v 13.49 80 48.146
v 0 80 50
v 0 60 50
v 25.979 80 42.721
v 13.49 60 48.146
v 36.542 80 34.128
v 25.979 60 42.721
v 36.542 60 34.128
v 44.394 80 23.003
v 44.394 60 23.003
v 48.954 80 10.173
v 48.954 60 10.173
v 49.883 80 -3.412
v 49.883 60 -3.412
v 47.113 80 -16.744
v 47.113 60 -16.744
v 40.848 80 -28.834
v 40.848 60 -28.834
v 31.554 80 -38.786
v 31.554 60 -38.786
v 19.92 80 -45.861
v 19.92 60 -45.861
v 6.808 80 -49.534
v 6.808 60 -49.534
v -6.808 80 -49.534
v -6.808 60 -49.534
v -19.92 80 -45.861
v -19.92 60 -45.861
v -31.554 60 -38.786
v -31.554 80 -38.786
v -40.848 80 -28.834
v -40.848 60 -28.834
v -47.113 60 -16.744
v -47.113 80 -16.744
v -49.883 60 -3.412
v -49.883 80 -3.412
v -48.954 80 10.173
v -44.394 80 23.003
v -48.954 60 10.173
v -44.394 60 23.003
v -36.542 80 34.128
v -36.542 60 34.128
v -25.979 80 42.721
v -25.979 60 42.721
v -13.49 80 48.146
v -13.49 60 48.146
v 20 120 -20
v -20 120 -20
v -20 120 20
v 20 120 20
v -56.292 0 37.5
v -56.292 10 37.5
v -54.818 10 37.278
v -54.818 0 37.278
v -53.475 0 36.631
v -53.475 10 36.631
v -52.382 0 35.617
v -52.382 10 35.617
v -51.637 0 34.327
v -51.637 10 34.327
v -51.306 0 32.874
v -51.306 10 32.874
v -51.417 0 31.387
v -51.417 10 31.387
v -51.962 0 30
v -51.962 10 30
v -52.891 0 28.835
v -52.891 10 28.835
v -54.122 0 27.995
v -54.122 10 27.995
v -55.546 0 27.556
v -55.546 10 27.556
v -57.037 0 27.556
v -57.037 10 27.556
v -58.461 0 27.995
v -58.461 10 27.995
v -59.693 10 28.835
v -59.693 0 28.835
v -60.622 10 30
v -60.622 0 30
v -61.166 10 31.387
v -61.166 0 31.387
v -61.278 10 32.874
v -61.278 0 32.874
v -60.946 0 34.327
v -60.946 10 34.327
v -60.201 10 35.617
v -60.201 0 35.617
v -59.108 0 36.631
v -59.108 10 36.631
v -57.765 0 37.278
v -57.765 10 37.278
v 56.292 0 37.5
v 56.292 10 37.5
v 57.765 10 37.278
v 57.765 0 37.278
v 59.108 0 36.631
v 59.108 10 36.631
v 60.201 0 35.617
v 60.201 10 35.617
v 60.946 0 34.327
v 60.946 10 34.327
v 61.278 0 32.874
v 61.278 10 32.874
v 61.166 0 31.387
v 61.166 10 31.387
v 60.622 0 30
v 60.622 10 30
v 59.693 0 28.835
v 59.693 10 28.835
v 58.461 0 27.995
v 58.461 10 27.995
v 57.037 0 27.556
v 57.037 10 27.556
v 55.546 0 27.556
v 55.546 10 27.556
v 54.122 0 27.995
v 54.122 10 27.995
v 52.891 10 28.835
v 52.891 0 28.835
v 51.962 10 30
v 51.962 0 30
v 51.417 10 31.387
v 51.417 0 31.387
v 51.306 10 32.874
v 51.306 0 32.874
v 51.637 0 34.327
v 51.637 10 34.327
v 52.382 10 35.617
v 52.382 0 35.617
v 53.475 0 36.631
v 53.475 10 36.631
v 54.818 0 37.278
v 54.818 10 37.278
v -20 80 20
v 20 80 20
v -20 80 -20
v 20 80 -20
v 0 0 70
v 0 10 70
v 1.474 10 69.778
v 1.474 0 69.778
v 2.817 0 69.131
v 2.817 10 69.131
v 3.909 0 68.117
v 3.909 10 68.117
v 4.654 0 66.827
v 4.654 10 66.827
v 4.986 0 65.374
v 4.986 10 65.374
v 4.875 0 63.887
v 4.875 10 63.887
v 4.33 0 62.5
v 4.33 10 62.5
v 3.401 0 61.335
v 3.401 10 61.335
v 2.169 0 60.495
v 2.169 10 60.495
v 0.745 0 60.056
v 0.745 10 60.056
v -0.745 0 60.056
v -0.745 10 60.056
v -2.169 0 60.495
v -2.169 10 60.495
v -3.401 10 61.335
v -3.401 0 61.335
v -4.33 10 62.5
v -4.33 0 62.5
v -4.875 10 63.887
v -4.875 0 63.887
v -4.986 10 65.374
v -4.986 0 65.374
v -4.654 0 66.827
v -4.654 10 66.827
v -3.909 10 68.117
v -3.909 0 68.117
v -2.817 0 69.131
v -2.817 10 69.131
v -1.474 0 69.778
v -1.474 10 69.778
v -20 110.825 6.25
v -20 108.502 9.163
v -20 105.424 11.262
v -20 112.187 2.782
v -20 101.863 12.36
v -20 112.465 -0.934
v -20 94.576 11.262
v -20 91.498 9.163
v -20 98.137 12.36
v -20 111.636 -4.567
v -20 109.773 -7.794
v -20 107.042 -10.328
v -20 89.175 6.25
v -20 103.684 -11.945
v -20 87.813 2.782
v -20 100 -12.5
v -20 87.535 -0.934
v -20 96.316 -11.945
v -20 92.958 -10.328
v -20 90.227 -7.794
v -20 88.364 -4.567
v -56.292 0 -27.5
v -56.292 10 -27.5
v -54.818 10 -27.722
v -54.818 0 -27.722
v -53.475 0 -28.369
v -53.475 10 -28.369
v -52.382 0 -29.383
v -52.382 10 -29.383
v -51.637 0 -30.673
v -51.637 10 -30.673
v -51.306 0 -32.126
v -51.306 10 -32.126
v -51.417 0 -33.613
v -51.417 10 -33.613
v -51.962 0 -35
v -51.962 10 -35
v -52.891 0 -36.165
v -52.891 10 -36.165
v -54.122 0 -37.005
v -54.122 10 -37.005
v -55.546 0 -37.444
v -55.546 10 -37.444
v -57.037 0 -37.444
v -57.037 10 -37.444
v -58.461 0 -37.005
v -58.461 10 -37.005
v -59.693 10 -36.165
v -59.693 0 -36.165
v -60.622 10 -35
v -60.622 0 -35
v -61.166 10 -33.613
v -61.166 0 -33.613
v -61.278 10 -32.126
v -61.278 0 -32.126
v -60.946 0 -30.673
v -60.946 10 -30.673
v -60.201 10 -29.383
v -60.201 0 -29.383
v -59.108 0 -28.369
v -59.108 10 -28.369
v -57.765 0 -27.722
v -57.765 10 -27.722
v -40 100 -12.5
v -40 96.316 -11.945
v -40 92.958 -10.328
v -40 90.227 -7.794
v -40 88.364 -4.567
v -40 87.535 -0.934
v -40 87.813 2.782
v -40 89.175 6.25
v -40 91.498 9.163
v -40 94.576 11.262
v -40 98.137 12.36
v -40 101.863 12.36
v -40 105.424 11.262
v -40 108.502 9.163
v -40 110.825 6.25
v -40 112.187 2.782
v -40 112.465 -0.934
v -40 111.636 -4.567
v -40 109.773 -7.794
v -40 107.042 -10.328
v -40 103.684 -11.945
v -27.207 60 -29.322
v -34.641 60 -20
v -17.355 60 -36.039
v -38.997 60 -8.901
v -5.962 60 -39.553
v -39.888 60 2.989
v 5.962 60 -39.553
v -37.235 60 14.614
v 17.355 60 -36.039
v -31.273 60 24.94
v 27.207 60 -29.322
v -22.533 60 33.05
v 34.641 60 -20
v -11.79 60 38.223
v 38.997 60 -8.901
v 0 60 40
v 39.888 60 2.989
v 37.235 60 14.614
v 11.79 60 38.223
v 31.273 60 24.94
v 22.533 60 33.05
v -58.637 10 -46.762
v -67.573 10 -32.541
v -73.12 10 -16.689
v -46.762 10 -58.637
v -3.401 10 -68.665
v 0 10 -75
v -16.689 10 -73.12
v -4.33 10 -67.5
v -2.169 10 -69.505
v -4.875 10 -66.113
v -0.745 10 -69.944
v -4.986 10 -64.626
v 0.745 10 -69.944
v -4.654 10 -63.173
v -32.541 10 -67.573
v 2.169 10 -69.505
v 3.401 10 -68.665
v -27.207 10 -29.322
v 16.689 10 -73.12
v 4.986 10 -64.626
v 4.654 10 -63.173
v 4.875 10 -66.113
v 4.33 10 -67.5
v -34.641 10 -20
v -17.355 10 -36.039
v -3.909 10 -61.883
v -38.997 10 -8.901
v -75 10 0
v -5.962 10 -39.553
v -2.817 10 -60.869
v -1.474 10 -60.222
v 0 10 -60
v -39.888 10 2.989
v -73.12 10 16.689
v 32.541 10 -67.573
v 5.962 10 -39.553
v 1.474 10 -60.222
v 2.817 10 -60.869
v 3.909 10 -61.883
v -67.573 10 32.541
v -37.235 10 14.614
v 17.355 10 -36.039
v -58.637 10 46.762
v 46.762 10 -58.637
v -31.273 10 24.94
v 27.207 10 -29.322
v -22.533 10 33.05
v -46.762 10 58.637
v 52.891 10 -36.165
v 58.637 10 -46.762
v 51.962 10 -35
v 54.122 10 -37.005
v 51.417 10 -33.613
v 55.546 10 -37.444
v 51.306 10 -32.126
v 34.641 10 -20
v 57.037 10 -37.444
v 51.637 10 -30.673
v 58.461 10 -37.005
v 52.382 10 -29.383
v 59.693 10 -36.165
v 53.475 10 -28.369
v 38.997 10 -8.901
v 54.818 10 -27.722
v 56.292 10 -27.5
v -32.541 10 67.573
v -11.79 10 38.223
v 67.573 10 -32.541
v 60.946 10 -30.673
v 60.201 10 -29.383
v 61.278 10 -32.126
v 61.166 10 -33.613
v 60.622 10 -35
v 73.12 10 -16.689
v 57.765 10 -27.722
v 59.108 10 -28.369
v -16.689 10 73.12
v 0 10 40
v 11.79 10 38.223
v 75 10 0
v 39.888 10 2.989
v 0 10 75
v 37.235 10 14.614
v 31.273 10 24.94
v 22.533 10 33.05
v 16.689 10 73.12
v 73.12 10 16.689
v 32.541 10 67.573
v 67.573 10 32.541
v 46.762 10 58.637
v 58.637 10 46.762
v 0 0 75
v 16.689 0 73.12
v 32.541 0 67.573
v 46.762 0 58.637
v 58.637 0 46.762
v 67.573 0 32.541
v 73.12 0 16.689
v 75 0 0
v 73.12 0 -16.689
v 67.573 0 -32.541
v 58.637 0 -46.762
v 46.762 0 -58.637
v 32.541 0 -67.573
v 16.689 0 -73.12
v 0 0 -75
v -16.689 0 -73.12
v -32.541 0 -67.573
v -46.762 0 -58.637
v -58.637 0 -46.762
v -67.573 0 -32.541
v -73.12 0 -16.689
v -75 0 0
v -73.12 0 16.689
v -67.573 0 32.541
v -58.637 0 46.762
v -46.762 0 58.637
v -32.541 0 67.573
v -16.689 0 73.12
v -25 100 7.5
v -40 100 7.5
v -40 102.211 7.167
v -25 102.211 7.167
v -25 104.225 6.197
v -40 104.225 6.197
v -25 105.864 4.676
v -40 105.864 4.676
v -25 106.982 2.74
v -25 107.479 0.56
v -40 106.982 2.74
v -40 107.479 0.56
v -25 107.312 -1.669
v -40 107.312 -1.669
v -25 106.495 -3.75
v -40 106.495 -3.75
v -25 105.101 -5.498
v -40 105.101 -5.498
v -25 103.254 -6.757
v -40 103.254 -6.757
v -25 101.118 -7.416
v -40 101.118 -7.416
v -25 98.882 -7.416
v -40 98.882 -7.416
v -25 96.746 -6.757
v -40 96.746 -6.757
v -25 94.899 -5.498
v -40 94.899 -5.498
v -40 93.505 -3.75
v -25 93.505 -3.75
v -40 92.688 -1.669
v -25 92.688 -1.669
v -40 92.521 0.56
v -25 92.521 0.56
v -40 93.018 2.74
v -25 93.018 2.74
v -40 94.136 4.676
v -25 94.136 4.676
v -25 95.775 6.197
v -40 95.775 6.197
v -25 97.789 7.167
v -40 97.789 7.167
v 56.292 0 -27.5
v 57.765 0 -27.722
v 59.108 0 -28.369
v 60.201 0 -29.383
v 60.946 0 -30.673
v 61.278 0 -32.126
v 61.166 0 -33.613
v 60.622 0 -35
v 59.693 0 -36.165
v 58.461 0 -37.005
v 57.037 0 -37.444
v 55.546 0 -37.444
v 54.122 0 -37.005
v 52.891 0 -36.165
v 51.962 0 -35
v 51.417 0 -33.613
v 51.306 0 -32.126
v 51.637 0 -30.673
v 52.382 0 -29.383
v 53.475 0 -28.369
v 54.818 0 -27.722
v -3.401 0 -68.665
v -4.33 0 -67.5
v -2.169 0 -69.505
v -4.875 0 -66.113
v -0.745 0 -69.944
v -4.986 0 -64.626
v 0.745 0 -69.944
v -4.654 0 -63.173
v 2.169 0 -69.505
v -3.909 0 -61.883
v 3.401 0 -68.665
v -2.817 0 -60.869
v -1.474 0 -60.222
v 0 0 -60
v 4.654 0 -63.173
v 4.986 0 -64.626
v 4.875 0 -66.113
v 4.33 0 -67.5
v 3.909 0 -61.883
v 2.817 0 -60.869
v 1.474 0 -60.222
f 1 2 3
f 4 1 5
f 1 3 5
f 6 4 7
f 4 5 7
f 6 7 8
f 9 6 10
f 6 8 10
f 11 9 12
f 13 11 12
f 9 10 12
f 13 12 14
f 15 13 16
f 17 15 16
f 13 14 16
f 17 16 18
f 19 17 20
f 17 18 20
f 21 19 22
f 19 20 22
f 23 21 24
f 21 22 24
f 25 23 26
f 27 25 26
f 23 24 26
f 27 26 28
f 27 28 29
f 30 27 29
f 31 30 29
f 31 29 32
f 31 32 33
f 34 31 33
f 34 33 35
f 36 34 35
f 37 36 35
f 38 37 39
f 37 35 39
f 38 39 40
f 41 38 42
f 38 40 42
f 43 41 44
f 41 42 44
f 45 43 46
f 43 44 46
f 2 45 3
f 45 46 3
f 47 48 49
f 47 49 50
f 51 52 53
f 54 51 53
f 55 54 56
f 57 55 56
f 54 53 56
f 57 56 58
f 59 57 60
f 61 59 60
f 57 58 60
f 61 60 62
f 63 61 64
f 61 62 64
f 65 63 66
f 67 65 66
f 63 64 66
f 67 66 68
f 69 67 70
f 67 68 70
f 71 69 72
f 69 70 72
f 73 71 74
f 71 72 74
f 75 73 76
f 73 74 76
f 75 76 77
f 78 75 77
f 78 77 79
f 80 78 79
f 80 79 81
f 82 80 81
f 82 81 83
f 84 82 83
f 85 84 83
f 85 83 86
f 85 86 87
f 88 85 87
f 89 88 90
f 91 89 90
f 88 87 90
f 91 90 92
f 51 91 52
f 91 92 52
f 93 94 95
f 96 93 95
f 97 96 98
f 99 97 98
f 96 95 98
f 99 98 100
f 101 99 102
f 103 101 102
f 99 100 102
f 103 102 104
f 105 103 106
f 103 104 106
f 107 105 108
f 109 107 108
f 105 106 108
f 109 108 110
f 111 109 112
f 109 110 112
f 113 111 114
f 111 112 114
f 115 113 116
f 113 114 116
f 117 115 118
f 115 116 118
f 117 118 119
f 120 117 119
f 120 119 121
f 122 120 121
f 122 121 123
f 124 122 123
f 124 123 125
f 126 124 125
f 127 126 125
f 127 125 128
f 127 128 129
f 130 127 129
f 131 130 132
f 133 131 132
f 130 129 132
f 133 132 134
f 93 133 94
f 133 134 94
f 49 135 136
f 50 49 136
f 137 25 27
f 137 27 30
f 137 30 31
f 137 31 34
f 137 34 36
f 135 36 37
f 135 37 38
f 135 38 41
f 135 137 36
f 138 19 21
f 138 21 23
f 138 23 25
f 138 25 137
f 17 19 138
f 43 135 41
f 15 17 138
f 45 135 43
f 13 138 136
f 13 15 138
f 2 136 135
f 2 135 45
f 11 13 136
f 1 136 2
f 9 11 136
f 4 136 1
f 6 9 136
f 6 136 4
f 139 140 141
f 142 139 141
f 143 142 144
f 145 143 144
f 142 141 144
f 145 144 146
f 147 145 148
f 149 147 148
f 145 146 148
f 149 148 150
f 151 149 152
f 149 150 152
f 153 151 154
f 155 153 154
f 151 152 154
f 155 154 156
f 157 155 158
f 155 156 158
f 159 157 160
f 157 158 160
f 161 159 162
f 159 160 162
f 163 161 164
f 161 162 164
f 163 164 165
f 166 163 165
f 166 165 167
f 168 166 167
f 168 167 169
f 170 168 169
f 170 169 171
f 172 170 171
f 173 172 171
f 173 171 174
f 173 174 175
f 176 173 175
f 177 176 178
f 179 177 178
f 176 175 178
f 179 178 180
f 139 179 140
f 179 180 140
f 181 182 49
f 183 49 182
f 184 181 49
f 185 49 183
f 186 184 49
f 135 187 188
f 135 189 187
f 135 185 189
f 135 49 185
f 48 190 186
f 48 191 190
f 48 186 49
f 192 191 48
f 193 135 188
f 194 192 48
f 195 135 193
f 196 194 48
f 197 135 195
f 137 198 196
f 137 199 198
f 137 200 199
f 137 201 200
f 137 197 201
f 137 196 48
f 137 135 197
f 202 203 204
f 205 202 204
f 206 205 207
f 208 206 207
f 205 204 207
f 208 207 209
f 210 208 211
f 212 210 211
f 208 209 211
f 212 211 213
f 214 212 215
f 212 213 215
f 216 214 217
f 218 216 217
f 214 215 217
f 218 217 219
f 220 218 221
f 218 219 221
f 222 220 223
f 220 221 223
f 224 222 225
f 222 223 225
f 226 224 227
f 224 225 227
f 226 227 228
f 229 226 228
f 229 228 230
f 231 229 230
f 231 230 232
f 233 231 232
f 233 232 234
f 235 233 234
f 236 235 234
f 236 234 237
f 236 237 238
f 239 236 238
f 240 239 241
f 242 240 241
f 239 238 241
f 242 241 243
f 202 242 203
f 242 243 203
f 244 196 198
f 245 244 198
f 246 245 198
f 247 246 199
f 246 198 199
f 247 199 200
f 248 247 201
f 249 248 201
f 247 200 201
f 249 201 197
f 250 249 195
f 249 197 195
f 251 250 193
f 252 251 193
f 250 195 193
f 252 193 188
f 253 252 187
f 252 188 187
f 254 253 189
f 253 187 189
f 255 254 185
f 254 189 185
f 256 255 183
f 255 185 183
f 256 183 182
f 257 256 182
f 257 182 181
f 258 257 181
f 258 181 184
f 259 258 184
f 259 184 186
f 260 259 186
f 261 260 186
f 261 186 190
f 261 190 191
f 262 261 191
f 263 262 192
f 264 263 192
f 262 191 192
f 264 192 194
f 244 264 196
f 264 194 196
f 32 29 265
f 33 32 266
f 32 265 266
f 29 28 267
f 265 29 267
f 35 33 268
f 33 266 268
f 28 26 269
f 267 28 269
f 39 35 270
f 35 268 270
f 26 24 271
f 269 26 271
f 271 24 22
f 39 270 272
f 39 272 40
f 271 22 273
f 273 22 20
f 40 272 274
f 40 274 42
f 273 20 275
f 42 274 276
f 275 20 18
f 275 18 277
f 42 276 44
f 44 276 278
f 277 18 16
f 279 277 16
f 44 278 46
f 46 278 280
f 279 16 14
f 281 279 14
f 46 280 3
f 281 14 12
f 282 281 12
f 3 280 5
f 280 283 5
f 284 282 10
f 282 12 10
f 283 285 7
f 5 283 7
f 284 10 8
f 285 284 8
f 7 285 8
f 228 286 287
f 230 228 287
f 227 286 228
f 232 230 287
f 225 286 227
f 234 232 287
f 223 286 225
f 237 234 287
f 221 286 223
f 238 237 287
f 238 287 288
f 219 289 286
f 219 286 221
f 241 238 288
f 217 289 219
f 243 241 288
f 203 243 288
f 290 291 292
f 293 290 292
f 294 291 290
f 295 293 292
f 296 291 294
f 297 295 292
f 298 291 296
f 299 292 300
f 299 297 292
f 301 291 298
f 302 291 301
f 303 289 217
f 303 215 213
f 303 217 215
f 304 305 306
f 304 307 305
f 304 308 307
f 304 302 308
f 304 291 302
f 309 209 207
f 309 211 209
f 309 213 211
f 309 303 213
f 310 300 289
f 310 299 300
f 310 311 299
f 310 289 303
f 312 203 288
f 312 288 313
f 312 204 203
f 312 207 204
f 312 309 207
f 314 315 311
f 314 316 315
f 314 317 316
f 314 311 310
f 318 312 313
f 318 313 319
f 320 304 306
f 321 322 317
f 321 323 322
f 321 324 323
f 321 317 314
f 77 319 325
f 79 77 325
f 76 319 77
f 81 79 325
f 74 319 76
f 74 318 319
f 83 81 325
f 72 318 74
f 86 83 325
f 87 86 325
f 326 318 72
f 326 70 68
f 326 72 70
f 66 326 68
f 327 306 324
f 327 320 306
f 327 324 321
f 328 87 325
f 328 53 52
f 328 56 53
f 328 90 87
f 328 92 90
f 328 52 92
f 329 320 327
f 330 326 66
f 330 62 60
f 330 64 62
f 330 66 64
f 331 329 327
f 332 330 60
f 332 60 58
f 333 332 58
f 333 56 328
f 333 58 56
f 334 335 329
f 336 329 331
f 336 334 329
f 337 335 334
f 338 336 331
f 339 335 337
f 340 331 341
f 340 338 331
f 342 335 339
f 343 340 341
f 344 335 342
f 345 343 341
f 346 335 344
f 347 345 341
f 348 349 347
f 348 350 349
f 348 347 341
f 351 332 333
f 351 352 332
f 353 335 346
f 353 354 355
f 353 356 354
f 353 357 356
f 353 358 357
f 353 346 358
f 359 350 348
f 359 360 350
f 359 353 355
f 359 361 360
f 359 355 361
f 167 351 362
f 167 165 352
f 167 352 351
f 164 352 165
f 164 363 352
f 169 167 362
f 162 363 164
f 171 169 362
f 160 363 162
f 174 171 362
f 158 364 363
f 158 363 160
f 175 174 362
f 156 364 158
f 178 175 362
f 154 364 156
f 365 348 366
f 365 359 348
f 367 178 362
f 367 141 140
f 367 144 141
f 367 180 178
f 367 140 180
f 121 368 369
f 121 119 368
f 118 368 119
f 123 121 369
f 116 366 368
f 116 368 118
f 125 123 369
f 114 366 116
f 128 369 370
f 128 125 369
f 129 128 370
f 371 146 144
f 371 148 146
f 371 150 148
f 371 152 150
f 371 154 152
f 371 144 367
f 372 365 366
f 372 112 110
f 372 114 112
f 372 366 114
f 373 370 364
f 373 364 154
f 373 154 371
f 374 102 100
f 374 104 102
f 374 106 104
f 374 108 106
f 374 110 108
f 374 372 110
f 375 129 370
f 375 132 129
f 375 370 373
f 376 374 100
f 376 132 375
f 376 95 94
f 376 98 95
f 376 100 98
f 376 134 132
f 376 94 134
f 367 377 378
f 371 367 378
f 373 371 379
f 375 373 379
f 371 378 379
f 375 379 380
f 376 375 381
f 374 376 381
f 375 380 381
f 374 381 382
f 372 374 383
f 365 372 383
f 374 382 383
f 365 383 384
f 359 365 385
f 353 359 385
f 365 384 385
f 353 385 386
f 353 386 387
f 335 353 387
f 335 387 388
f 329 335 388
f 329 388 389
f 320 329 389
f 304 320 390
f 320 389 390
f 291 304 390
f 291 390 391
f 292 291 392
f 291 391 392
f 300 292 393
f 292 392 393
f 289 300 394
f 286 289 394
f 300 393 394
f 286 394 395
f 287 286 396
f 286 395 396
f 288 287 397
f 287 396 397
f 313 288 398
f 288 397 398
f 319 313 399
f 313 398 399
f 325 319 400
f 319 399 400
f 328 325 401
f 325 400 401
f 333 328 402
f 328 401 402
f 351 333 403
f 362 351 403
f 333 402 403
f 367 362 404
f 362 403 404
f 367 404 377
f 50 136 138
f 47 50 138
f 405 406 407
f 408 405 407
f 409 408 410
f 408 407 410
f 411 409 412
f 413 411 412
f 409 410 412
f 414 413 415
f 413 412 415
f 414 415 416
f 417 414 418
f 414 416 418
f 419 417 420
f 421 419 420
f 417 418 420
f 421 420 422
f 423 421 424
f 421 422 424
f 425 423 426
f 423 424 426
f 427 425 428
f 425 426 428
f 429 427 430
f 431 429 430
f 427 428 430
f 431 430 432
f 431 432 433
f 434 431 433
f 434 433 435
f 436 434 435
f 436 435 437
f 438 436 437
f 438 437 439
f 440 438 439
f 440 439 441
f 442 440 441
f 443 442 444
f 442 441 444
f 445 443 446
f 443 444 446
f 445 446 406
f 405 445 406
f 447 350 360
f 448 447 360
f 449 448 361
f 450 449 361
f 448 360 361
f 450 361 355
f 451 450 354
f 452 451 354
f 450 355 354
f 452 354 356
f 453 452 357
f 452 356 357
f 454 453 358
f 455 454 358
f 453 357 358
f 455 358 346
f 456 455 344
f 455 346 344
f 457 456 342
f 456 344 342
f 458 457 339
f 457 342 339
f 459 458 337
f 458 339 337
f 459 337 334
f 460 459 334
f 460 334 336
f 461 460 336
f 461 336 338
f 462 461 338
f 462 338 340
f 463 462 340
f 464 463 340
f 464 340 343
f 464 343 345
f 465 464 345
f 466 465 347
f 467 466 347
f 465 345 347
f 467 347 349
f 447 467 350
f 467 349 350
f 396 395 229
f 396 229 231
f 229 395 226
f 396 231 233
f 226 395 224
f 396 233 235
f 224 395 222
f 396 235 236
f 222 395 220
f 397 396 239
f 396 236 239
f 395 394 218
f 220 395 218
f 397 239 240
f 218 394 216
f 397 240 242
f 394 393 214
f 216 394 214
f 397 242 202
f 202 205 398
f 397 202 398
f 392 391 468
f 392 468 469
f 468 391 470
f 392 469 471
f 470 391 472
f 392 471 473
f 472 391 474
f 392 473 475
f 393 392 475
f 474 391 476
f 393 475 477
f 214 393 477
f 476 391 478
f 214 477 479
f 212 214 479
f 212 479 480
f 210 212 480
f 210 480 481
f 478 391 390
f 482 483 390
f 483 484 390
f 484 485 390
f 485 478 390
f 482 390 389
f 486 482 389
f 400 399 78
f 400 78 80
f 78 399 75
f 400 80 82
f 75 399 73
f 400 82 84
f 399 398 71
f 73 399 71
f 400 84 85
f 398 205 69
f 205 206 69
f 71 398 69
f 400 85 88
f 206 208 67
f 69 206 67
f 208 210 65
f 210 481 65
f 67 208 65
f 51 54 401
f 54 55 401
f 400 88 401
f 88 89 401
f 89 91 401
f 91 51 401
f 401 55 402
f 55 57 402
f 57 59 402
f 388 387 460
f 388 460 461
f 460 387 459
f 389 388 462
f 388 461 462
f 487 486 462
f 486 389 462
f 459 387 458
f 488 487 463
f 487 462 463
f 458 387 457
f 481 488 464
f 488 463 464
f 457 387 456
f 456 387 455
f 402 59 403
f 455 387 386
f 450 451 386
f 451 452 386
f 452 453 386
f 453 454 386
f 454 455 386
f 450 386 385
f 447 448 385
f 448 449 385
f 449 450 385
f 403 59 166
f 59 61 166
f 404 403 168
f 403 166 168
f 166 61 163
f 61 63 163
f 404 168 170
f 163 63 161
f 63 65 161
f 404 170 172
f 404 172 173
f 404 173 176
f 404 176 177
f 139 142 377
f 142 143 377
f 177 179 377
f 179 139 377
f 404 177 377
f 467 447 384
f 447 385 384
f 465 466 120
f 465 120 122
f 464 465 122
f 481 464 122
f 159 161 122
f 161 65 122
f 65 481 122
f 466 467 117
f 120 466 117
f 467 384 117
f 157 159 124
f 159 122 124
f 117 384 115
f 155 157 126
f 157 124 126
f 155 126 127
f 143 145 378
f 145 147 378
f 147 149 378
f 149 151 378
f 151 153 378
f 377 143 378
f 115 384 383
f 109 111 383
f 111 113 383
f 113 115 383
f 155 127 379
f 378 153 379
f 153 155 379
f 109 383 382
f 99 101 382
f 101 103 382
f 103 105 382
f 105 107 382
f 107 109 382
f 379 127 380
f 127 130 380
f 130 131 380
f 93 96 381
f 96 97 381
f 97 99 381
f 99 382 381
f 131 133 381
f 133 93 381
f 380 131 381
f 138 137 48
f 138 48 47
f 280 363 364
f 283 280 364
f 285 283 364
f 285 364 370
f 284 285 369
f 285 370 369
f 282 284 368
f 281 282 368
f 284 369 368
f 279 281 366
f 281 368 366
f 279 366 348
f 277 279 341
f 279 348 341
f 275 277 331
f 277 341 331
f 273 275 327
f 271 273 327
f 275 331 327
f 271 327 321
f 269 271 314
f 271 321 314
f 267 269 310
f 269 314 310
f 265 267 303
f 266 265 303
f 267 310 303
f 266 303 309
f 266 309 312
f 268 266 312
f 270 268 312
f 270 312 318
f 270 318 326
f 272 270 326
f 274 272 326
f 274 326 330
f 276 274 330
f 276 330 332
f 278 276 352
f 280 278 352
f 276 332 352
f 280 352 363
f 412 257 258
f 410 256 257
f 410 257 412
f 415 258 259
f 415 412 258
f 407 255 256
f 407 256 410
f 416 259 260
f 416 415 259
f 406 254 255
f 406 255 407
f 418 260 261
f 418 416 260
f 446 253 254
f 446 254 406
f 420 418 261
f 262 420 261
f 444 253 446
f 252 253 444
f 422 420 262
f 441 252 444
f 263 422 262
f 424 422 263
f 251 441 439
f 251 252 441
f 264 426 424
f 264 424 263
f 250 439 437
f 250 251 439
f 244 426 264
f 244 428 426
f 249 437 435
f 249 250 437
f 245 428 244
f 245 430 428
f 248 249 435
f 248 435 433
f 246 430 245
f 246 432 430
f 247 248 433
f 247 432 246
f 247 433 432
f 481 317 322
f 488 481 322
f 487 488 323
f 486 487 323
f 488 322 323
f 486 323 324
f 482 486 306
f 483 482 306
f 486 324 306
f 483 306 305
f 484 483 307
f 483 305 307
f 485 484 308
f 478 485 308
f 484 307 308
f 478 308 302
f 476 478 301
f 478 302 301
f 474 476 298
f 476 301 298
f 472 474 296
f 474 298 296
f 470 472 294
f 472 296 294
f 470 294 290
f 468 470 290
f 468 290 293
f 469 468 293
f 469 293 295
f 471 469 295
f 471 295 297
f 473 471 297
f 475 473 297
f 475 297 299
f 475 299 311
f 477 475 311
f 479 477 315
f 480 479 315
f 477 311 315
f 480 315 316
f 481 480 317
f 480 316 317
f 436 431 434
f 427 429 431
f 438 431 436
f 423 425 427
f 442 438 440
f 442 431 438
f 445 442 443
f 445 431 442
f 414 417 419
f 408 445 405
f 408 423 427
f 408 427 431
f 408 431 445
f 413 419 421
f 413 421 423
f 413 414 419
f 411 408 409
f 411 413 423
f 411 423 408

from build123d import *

# Parameters (mm, degrees)
SKETCH1_R           = 75
BOSS_EXTRUDE1_DEPTH = 10
SKETCH2_R           = 5
CUT_EXTRUDE1_DEPTH  = 10
SKETCH3_R           = 40
BOSS_EXTRUDE2_DEPTH = 50
SKETCH4_R           = 50
BOSS_EXTRUDE3_DEPTH = 20
SKETCH5_W           = 40
SKETCH5_H           = 40
BOSS_EXTRUDE4_DEPTH = 40
SKETCH6_R           = 12.5
BOSS_EXTRUDE5_DEPTH = 20
SKETCH9_R           = 7.5
CUT_EXTRUDE2_DEPTH  = 15


with BuildPart() as part:
    # Sketch1 → Boss-Extrude1 (new body)
    with BuildSketch(Plane(origin=(0, 0, 0), x_dir=(1, 0, 0), z_dir=(0, 1, 0))):
        with Locations(Location((0, 0, 0), (0, 0, 270))):
            Circle(SKETCH1_R)
    extrude(amount=BOSS_EXTRUDE1_DEPTH)

    # Sketch2 → Cut-Extrude1 (cut)
    with BuildSketch(Plane(origin=(0, 10, 0), x_dir=(1, 0, 0), z_dir=(0, 1, 0))):
        with Locations(Location((0, 65, 0), (0, 0, 270))):
            Circle(SKETCH2_R)
        with Locations(Location((56.291651246, 32.5, 0), (0, 0, 270))):
            Circle(SKETCH2_R)
        with Locations(Location((56.291651246, -32.5, 0), (0, 0, 270))):
            Circle(SKETCH2_R)
        with Locations(Location((0, -65, 0), (0, 0, 270))):
            Circle(SKETCH2_R)
        with Locations(Location((-56.291651246, -32.5, 0), (0, 0, 270))):
            Circle(SKETCH2_R)
        with Locations(Location((-56.291651246, 32.5, 0), (0, 0, 270))):
            Circle(SKETCH2_R)
    extrude(amount=-CUT_EXTRUDE1_DEPTH, mode=Mode.SUBTRACT)

    # Sketch3 → Boss-Extrude2 (add)
    with BuildSketch(Plane(origin=(0, 10, 0), x_dir=(1, 0, 0), z_dir=(0, 1, 0))):
        with Locations(Location((0, 0, 0), (0, 0, 270))):
            Circle(SKETCH3_R)
    extrude(amount=BOSS_EXTRUDE2_DEPTH)

    # Sketch4 → Boss-Extrude3 (add)
    with BuildSketch(Plane(origin=(0, 60, 0), x_dir=(1, 0, 0), z_dir=(0, 1, 0))):
        with Locations(Location((0, 0, 0), (0, 0, 270))):
            Circle(SKETCH4_R)
    extrude(amount=BOSS_EXTRUDE3_DEPTH)

    # Sketch5 → Boss-Extrude4 (add)
    with BuildSketch(Plane(origin=(0, 80, 0), x_dir=(1, 0, 0), z_dir=(0, 1, 0))):
        Rectangle(SKETCH5_W, SKETCH5_H)
    extrude(amount=BOSS_EXTRUDE4_DEPTH)

    # Sketch6 → Boss-Extrude5 (add)
    with BuildSketch(Plane.ZY.offset(20)):
        with Locations(Location((0, 100, 0), (0, 0, 180))):
            Circle(SKETCH6_R)
    extrude(amount=BOSS_EXTRUDE5_DEPTH)

    # Sketch9 → Cut-Extrude2 (cut)
    with BuildSketch(Plane.ZY.offset(40)):
        with Locations((0, 100)):
            Circle(SKETCH9_R)
    extrude(amount=-CUT_EXTRUDE2_DEPTH, mode=Mode.SUBTRACT)


solid = part.part
